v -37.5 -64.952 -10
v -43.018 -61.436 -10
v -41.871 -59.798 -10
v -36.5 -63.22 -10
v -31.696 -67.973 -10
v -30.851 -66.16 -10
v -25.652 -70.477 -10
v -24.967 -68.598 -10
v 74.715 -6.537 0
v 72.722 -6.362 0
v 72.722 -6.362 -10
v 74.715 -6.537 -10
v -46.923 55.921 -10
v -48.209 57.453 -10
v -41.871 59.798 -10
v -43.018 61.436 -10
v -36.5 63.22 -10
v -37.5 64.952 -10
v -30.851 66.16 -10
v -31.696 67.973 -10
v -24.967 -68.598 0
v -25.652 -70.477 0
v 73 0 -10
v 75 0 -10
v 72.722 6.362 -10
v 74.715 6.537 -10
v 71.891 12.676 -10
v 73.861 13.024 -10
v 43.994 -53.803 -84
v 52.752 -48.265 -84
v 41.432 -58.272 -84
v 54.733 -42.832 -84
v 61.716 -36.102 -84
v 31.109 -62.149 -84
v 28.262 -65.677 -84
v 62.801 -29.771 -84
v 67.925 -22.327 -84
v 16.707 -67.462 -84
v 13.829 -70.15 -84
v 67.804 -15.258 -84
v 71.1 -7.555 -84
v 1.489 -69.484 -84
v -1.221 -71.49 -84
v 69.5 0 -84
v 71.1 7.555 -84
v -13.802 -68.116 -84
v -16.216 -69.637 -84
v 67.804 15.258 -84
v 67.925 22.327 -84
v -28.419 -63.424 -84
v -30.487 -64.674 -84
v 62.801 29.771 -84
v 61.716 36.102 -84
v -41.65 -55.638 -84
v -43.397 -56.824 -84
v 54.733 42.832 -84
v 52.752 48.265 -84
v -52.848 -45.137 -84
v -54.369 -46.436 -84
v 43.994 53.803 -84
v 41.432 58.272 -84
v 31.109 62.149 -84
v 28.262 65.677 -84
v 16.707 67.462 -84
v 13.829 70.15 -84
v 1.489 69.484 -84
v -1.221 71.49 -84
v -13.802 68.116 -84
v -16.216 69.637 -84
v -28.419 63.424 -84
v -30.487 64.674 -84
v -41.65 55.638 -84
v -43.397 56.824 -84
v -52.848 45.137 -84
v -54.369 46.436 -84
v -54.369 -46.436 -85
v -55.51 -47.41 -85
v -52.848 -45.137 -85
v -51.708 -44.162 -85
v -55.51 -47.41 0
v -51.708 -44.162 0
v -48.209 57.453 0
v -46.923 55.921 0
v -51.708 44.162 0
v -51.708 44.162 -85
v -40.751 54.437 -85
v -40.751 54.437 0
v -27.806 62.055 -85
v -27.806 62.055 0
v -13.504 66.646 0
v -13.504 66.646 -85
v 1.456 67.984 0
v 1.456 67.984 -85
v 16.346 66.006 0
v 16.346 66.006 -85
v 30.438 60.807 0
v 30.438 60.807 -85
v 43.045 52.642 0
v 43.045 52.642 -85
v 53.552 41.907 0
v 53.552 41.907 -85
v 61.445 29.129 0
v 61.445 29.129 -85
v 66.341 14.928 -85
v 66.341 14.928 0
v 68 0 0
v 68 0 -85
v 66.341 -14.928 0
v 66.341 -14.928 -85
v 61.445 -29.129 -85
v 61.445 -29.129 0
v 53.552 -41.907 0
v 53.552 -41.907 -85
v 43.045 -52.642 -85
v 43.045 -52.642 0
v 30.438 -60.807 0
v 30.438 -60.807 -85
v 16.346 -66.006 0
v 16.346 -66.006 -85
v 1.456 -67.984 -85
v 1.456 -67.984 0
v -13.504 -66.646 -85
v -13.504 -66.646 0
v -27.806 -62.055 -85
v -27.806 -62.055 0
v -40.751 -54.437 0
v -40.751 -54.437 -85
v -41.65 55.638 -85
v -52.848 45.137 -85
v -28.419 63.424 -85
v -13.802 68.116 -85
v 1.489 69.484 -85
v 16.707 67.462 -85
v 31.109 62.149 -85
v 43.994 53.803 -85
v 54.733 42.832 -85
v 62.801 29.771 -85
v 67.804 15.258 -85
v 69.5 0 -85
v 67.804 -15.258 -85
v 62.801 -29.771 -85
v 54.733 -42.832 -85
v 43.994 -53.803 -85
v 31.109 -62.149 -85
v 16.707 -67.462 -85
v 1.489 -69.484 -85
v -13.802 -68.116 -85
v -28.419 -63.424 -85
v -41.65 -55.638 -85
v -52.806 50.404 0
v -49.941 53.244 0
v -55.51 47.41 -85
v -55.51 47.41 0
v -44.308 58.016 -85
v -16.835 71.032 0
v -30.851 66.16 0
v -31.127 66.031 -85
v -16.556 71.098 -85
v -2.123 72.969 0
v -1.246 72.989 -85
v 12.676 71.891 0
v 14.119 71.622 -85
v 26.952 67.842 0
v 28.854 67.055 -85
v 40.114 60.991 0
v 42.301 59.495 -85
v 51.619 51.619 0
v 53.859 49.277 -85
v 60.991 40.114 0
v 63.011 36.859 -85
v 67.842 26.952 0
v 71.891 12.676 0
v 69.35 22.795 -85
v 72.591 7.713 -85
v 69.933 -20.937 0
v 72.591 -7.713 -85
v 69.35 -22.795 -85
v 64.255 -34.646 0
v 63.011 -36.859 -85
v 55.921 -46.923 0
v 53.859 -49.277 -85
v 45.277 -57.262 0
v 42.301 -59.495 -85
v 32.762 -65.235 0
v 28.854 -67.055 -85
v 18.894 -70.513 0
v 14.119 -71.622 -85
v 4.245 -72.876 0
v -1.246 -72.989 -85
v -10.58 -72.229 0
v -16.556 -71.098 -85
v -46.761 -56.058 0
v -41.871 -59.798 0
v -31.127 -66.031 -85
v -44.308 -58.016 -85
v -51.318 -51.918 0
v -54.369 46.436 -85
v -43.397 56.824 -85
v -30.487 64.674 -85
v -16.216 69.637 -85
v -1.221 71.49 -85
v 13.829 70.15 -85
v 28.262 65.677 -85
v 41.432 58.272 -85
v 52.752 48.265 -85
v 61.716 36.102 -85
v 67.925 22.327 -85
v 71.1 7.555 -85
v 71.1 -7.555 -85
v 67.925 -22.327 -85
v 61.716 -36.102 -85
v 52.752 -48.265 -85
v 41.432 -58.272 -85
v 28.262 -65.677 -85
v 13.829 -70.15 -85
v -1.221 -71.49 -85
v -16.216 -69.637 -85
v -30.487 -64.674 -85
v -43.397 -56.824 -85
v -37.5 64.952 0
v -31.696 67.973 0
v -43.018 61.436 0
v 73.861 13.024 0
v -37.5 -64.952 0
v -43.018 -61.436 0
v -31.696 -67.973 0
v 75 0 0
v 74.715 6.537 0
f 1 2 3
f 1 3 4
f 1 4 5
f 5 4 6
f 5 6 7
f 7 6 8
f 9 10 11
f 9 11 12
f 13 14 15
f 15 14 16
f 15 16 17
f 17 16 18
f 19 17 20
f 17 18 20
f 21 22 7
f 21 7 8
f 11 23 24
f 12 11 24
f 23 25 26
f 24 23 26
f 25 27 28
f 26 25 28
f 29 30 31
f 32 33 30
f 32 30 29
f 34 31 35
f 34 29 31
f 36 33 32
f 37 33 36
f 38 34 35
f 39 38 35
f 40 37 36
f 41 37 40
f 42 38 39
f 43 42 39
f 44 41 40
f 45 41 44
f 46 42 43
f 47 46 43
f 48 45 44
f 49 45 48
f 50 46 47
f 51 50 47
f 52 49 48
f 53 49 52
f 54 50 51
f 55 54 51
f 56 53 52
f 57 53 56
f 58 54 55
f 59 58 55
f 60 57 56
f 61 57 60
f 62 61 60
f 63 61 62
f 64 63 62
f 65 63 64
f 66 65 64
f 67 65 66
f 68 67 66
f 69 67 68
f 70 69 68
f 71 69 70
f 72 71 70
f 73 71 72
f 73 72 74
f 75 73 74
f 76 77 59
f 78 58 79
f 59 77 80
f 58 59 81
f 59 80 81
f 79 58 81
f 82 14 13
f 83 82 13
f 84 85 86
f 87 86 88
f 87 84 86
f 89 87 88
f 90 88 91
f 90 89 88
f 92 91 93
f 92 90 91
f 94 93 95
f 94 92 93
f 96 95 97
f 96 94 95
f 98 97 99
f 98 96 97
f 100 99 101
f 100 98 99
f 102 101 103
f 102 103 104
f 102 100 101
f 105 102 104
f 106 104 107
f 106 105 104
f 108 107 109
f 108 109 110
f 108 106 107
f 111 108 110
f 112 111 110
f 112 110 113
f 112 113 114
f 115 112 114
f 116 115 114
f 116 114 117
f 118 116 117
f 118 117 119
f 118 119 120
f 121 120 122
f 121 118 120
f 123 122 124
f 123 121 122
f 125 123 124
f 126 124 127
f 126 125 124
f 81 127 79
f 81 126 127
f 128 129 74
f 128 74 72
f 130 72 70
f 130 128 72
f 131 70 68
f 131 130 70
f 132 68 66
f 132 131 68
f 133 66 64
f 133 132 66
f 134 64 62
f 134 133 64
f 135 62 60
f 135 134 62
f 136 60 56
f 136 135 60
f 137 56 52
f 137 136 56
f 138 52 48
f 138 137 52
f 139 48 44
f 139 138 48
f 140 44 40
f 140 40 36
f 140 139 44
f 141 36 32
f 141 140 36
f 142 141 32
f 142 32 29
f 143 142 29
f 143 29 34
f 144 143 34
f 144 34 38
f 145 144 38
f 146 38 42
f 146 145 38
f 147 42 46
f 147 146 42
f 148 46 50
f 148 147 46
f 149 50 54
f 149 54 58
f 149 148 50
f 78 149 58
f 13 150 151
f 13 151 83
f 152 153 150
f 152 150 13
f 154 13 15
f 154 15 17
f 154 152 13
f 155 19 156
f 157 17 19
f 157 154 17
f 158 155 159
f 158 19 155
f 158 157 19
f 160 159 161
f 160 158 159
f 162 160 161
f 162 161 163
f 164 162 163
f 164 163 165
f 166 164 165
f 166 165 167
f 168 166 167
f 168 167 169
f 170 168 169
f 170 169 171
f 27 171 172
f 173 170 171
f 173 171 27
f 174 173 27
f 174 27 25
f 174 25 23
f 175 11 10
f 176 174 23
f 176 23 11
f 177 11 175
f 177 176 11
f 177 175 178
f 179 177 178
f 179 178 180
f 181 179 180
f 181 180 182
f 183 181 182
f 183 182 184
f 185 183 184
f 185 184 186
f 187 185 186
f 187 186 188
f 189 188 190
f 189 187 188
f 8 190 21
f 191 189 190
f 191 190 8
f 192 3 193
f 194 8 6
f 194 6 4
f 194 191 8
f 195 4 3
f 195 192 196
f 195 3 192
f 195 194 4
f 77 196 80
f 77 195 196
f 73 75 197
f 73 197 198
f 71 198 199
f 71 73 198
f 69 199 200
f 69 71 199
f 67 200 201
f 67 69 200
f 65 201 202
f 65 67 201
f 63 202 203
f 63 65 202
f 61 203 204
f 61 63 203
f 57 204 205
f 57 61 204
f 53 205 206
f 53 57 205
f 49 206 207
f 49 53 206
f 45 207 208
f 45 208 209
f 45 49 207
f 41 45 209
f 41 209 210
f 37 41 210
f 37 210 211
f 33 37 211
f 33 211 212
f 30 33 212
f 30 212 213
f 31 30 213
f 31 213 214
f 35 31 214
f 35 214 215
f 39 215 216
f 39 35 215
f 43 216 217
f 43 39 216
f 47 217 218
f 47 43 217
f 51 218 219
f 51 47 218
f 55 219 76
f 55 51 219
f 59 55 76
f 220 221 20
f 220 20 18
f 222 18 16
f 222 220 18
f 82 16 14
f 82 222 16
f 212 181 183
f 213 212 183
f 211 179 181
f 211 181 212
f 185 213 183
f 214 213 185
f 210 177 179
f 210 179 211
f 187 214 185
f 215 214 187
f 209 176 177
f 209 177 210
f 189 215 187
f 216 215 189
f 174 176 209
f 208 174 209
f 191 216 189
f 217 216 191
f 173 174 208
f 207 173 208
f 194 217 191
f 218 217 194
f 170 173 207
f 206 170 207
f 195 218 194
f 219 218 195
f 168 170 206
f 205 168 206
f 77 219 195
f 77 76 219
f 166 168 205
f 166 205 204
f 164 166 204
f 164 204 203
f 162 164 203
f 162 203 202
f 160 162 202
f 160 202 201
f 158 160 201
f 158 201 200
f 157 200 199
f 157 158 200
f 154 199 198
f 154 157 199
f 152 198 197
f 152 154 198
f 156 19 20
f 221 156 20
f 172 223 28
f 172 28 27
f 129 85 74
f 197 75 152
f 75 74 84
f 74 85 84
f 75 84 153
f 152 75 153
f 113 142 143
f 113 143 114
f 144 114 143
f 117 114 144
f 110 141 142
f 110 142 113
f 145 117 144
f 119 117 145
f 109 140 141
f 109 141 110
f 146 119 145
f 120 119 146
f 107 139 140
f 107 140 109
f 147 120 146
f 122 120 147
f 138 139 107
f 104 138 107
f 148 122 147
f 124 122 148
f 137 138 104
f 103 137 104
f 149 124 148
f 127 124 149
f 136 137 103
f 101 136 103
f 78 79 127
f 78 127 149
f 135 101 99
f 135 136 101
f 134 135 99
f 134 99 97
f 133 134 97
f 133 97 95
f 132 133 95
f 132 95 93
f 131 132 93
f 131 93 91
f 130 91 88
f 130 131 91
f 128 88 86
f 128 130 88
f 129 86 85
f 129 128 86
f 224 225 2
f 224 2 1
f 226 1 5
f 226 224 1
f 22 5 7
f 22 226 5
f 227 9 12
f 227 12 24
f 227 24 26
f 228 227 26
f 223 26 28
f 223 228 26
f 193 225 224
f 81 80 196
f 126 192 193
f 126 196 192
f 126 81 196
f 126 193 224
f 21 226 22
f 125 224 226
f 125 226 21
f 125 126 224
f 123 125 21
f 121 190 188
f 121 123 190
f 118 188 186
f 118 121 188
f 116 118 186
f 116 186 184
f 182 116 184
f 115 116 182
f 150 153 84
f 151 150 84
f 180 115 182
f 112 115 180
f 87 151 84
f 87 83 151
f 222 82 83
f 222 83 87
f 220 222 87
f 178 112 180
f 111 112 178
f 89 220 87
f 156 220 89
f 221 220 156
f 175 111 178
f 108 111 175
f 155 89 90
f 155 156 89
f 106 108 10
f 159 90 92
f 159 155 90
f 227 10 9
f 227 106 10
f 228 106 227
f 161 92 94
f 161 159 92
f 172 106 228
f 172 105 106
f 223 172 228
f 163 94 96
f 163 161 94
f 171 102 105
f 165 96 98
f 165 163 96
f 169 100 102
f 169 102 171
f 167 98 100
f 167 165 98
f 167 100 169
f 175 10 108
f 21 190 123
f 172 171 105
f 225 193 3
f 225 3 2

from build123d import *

# Parameters (mm, degrees)
F3_DEPTH = 10
F5_DEPTH = 85


with BuildPart() as f1:
    # F0 (on Front) → F1 (revolve)
    with BuildSketch(Plane.XZ):
        Polygon((-68, 0), (-73, 0), (-73, -85), (-71.5, -85), (-71.5, -84), (-69.5, -84), (-69.5, -85), (-68, -85), align=None)
    revolve(axis=Axis((0, 0, -12.456594), (0, 0, -1)))

    # F2 (on face) → F3 (join)
    with BuildSketch(Plane.XY):
        with BuildLine():
            Line((-25.651511, -70.476947), (-24.96747, -68.597561))
            ThreePointArc((-24.96747, -68.597561), (-33.707649, -64.751791), (-41.87108, -59.798099))
            Line((-41.87108, -59.798099), (-43.018233, -61.436403))
            ThreePointArc((-43.018233, -61.436403), (-34.631146, -66.525812), (-25.651511, -70.476947))
        make_face()
        with BuildLine():
            Line((73.860581, 13.023613), (71.890966, 12.676317))
            ThreePointArc((71.890966, 12.676317), (72.93052, 3.184215), (72.722213, -6.362369))
            Line((72.722213, -6.362369), (74.714602, -6.536681))
            ThreePointArc((74.714602, -6.536681), (74.928617, 3.271454), (73.860581, 13.023613))
        make_face()
        with BuildLine():
            Line((-48.209071, 57.453333), (-46.923496, 55.921244))
            ThreePointArc((-46.923496, 55.921244), (-39.222871, 61.567576), (-30.851133, 66.160468))
            Line((-30.851133, 66.160468), (-31.69637, 67.973084))
            ThreePointArc((-31.69637, 67.973084), (-40.297471, 63.254358), (-48.209071, 57.453333))
        make_face()
    extrude(amount=-F3_DEPTH)

    # F4 (on face) → F5 (cut, through all)
    with BuildSketch(Plane.XY):
        with BuildLine():
            ThreePointArc((-55.509635, 47.409708), (-73, 0), (-55.509635, -47.409708))
            Line((-55.509635, -47.409708), (-51.707606, -44.162467))
            ThreePointArc((-51.707606, -44.162467), (-68, 0), (-51.707606, 44.162467))
            Line((-51.707606, 44.162467), (-55.509635, 47.409708))
        make_face()
    extrude(amount=-F5_DEPTH, mode=Mode.SUBTRACT)


solid = f1.part
